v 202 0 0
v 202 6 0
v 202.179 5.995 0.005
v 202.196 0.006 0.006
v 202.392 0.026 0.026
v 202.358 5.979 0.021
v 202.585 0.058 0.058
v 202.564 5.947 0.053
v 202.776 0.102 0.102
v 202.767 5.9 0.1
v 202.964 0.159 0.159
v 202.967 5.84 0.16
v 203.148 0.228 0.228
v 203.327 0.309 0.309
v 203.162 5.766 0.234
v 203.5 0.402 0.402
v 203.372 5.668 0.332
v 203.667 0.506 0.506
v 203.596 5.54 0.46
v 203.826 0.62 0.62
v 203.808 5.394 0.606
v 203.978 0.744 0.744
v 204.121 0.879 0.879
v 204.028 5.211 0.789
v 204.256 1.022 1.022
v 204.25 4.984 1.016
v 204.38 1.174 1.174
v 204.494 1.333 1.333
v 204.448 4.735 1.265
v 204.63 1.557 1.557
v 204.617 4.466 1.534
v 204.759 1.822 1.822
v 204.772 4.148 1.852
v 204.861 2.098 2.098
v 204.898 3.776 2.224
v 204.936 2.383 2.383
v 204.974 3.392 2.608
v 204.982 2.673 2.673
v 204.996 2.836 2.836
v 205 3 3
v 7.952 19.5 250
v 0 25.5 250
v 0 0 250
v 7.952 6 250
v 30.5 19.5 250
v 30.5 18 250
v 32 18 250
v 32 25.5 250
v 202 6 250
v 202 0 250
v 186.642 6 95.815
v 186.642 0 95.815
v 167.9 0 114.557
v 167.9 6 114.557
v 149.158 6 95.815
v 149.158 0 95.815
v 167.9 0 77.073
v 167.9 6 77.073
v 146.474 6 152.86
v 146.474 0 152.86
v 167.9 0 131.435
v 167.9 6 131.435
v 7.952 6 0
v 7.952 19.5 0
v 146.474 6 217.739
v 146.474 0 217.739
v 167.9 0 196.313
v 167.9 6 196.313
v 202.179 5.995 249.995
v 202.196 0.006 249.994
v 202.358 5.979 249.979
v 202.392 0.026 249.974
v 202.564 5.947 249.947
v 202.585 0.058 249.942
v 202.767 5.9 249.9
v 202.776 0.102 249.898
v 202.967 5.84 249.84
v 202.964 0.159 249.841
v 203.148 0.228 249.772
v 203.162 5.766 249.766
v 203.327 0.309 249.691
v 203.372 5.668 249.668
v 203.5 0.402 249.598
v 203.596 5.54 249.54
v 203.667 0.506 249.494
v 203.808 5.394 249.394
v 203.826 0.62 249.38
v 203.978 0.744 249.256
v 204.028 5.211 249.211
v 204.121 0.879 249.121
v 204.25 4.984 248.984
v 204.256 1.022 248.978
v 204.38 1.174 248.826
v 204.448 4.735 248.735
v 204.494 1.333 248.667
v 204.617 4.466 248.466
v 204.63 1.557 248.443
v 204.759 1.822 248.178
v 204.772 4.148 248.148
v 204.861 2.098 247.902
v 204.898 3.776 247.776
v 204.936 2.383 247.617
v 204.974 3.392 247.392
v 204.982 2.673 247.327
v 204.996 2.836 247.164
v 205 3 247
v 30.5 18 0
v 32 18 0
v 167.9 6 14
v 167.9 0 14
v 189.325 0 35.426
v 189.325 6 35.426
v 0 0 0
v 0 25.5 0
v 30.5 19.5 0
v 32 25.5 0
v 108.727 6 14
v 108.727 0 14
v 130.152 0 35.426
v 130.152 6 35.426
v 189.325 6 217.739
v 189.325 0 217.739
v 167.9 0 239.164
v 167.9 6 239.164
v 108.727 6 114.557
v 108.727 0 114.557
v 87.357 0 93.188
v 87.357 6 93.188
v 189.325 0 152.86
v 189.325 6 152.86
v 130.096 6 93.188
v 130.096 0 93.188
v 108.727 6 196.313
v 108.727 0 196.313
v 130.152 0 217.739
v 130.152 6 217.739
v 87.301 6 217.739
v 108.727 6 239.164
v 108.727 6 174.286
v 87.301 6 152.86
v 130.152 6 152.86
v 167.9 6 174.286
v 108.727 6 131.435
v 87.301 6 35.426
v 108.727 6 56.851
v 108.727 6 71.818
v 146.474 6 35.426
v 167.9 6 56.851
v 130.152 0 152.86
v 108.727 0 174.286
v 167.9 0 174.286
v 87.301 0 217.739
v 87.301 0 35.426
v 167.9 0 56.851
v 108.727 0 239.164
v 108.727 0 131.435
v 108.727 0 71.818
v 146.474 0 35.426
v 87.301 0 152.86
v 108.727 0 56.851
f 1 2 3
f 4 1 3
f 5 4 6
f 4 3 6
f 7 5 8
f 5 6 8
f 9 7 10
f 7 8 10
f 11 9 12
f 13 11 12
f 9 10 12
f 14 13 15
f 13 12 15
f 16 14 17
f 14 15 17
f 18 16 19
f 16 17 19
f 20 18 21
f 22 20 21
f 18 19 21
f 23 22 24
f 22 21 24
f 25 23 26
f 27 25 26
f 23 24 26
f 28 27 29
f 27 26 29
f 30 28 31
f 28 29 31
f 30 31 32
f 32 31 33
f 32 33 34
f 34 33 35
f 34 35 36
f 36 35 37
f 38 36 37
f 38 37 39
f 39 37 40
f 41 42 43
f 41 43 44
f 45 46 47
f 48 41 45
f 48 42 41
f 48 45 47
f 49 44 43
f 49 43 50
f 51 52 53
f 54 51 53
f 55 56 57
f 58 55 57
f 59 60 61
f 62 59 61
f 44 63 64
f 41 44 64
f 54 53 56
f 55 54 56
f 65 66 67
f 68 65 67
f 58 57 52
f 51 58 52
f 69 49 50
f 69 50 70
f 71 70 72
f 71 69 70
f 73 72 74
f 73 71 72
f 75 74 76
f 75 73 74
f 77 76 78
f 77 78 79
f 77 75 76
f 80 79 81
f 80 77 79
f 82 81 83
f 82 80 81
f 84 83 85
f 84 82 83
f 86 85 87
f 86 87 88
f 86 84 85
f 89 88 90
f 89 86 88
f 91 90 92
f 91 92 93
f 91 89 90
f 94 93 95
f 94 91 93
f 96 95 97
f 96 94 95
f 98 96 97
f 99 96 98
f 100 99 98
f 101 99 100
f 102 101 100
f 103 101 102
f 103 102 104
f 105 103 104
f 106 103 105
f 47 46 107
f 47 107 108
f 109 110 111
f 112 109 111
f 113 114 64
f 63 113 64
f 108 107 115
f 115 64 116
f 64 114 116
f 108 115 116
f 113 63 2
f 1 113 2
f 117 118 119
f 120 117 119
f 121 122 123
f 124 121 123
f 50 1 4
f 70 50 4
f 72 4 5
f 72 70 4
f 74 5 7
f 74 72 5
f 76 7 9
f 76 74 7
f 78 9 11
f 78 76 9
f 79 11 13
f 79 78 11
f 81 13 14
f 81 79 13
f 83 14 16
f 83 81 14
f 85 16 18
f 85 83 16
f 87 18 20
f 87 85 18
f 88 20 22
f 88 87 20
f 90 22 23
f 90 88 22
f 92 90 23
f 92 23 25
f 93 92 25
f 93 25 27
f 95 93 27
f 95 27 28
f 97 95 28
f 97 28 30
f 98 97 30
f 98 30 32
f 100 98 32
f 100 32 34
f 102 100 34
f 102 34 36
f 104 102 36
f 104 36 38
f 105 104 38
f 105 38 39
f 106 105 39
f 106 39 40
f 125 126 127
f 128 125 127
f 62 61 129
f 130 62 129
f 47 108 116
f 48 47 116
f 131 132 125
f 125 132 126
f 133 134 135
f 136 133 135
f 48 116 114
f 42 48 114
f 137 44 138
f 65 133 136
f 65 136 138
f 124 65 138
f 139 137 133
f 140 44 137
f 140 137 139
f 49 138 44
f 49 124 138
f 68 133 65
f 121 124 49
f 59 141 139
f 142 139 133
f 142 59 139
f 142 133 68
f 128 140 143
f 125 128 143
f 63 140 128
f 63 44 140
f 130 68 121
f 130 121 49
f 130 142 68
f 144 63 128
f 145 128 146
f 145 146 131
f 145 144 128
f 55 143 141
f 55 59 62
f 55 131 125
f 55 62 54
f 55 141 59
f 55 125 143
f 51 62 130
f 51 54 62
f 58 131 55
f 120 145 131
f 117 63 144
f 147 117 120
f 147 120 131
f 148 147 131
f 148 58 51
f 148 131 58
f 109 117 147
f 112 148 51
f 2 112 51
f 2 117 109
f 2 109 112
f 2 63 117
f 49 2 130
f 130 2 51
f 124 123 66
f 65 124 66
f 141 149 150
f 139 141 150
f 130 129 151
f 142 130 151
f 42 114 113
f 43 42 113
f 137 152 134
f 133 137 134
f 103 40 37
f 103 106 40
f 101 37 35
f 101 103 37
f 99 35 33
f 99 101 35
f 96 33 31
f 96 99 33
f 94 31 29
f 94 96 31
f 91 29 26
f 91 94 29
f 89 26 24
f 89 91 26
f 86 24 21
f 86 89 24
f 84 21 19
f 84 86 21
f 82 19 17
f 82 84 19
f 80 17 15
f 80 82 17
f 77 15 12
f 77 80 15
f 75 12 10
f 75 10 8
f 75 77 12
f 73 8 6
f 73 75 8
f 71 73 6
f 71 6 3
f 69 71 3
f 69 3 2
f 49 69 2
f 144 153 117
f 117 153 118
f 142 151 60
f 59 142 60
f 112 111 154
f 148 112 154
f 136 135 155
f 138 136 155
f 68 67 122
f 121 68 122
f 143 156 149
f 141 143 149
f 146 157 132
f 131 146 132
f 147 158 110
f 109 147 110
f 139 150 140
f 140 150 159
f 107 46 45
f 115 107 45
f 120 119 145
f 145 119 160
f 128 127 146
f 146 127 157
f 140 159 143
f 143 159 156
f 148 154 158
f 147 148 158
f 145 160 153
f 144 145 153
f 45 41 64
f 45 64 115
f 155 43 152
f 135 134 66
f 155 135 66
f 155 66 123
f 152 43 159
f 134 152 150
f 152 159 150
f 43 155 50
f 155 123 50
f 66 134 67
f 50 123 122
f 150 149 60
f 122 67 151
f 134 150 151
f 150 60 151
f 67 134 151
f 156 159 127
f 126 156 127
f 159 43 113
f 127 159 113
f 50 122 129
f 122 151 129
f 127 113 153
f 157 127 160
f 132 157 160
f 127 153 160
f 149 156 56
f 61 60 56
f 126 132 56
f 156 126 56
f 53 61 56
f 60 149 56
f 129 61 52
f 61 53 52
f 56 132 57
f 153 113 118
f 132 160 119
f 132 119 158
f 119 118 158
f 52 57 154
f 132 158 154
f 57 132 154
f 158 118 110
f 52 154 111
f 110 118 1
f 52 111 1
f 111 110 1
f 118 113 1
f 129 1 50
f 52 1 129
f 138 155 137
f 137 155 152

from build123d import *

# Parameters (mm, degrees)
F0_W     = 197.0480888034
F0_H     = 6
F0_W_2   = 7.9519111966
F0_H_2   = 13.5
F0_W_3   = 1.5
F0_H_3   = 1.5
F1_DEPTH = 250
F3_DEPTH = 25
F4_R     = 2.99999


# Not quite as in the source:
# - a fillet or chamfer is up to 0.001 mm smaller than in the source, because OpenCascade refuses the exact size


with BuildPart() as f1:
    # F0 (on Top) → F1 (new body)
    with BuildSketch(Plane.XY):
        with Locations((106.4759555983, 3)):
            Rectangle(F0_W, F0_H)
        with Locations((3.9759555983, 12.75)):
            Rectangle(F0_W_2, F0_H_2)
        with Locations((3.9759555983, 3)):
            Rectangle(F0_W_2, F0_H)
        with Locations((3.9759555983, 22.5)):
            Rectangle(F0_W_2, F0_H)
        Polygon((7.9519111966, 25.5), (7.9519111966, 19.5), (30.5, 19.5), (32, 19.5), (32, 25.5), align=None)
        with Locations((31.25, 18.75)):
            Rectangle(F0_W_3, F0_H_3)
    extrude(amount=F1_DEPTH)

    # F2 (on face) → F3 (cut)
    with BuildSketch(Plane.XZ):
        Polygon((87.3010246393, 35.425593216), (108.7266178553, 14), (130.1522110713, 35.425593216), (108.7266178553, 56.851186432), align=None)
        Polygon((146.474054042, 35.425593216), (167.8996472581, 14), (189.3252404741, 35.425593216), (167.8996472581, 56.851186432), align=None)
        Polygon((149.1576427927, 95.8152501475), (167.8996472581, 77.0732456821), (186.6416517235, 95.8152501475), (167.8996472581, 114.5572546129), align=None)
        Polygon((87.3569478805, 93.1875846381), (108.7266178553, 71.8179146634), (130.09628783, 93.1875846381), (108.7266178553, 114.5572546129), align=None)
        Polygon((87.3010246393, 152.8602018807), (108.7266178553, 131.4346086647), (130.1522110713, 152.8602018807), (108.7266178553, 174.2857950967), align=None)
        Polygon((146.474054042, 152.8602018807), (167.8996472581, 131.4346086647), (189.3252404741, 152.8602018807), (167.8996472581, 174.2857950967), align=None)
        Polygon((146.474054042, 217.7387669785), (167.8996472581, 196.3131737625), (189.3252404741, 217.7387669785), (167.8996472581, 239.1643601945), align=None)
        Polygon((87.3010246393, 217.7387669785), (108.7266178553, 196.3131737625), (130.1522110713, 217.7387669785), (108.7266178553, 239.1643601945), align=None)
    extrude(amount=-F3_DEPTH, mode=Mode.SUBTRACT)

    # F4 (radius 3 in the source; OpenCascade refuses exactly that, so slightly less here)
    f4_edges = [f1.edges().sort_by_distance(p)[0] for p in [
        (205, 0, 125),
        (205, 6, 125),
        (205, 3, 0),
        (205, 3, 250),
    ]]
    fillet(f4_edges, radius=F4_R)


solid = f1.part
